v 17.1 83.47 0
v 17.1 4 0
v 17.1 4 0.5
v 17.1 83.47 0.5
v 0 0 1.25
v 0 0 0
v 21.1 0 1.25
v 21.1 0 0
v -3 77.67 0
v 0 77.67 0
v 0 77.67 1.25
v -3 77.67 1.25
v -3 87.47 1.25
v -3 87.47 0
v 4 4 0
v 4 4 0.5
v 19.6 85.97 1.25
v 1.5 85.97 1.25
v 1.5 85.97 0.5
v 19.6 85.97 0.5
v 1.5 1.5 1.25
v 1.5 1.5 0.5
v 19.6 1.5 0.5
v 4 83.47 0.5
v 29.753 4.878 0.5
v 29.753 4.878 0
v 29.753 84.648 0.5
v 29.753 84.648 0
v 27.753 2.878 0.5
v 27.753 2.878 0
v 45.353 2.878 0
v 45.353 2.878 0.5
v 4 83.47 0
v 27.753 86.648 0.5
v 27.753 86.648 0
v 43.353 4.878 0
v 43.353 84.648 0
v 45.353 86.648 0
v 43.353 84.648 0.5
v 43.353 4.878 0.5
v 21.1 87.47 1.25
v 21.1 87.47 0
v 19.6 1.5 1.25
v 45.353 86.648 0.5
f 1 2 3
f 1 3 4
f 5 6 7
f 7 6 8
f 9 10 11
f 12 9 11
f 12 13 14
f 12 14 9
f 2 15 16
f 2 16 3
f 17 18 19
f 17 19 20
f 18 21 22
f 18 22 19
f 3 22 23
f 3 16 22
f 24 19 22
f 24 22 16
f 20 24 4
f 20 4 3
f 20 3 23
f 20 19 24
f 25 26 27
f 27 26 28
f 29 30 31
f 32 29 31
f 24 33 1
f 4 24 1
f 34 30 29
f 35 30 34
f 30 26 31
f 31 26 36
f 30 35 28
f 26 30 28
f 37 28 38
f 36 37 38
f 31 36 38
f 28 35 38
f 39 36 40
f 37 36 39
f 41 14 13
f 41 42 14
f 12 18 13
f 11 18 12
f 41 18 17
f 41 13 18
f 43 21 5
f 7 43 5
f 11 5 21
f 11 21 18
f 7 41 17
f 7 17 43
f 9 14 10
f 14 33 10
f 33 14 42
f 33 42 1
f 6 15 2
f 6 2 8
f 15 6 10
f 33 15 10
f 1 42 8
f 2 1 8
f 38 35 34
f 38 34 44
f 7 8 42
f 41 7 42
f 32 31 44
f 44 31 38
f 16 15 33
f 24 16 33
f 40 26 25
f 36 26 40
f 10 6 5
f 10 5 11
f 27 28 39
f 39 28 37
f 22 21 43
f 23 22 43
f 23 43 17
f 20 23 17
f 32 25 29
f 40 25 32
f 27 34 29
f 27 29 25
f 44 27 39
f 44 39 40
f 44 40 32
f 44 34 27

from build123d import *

# Parameters (mm, degrees)
F0_W     = 21.1
F0_H     = 87.47
F0_W_2   = 13.1
F0_H_2   = 79.47
F1_DEPTH = 1.25
F2_W     = 18.1
F2_H     = 84.47
F3_DEPTH = 0.75
F4_W     = 17.6
F4_H     = 83.77
F4_W_2   = 13.6
F4_H_2   = 79.77
F5_DEPTH = 0.5
F6_W     = 9.8
F6_H     = 1.25
F7_DEPTH = 3


with BuildPart() as f1:
    # F0 (on Top) → F1 (new body)
    with BuildSketch(Plane.XY):
        with Locations((10.55, 43.735)):
            Rectangle(F0_W, F0_H)
        with Locations((10.55, 43.735)):
            Rectangle(F0_W_2, F0_H_2, mode=Mode.SUBTRACT)
    extrude(amount=F1_DEPTH)

    # F2 (on face) → F3 (cut)
    with BuildSketch(Plane.XY.offset(1.25)):
        with Locations((10.55, 43.735)):
            Rectangle(F2_W, F2_H)
    extrude(amount=-F3_DEPTH, mode=Mode.SUBTRACT)

    # F6 (on face) → F7 (join)
    with BuildSketch(Plane(origin=(0, 0, 0), x_dir=(0, -1, 0), z_dir=(-1, 0, 0))):
        with Locations((-82.57, 0.625)):
            Rectangle(F6_W, F6_H)
    extrude(amount=F7_DEPTH)


with BuildPart() as f5:
    # F4 (on Top) → F5 (new body)
    with BuildSketch(Plane.XY):
        with Locations((36.552641, 44.763047)):
            Rectangle(F4_W, F4_H)
        with Locations((36.552641, 44.763047)):
            Rectangle(F4_W_2, F4_H_2, mode=Mode.SUBTRACT)
    extrude(amount=F5_DEPTH)


solid = Compound([f1.part, f5.part])
